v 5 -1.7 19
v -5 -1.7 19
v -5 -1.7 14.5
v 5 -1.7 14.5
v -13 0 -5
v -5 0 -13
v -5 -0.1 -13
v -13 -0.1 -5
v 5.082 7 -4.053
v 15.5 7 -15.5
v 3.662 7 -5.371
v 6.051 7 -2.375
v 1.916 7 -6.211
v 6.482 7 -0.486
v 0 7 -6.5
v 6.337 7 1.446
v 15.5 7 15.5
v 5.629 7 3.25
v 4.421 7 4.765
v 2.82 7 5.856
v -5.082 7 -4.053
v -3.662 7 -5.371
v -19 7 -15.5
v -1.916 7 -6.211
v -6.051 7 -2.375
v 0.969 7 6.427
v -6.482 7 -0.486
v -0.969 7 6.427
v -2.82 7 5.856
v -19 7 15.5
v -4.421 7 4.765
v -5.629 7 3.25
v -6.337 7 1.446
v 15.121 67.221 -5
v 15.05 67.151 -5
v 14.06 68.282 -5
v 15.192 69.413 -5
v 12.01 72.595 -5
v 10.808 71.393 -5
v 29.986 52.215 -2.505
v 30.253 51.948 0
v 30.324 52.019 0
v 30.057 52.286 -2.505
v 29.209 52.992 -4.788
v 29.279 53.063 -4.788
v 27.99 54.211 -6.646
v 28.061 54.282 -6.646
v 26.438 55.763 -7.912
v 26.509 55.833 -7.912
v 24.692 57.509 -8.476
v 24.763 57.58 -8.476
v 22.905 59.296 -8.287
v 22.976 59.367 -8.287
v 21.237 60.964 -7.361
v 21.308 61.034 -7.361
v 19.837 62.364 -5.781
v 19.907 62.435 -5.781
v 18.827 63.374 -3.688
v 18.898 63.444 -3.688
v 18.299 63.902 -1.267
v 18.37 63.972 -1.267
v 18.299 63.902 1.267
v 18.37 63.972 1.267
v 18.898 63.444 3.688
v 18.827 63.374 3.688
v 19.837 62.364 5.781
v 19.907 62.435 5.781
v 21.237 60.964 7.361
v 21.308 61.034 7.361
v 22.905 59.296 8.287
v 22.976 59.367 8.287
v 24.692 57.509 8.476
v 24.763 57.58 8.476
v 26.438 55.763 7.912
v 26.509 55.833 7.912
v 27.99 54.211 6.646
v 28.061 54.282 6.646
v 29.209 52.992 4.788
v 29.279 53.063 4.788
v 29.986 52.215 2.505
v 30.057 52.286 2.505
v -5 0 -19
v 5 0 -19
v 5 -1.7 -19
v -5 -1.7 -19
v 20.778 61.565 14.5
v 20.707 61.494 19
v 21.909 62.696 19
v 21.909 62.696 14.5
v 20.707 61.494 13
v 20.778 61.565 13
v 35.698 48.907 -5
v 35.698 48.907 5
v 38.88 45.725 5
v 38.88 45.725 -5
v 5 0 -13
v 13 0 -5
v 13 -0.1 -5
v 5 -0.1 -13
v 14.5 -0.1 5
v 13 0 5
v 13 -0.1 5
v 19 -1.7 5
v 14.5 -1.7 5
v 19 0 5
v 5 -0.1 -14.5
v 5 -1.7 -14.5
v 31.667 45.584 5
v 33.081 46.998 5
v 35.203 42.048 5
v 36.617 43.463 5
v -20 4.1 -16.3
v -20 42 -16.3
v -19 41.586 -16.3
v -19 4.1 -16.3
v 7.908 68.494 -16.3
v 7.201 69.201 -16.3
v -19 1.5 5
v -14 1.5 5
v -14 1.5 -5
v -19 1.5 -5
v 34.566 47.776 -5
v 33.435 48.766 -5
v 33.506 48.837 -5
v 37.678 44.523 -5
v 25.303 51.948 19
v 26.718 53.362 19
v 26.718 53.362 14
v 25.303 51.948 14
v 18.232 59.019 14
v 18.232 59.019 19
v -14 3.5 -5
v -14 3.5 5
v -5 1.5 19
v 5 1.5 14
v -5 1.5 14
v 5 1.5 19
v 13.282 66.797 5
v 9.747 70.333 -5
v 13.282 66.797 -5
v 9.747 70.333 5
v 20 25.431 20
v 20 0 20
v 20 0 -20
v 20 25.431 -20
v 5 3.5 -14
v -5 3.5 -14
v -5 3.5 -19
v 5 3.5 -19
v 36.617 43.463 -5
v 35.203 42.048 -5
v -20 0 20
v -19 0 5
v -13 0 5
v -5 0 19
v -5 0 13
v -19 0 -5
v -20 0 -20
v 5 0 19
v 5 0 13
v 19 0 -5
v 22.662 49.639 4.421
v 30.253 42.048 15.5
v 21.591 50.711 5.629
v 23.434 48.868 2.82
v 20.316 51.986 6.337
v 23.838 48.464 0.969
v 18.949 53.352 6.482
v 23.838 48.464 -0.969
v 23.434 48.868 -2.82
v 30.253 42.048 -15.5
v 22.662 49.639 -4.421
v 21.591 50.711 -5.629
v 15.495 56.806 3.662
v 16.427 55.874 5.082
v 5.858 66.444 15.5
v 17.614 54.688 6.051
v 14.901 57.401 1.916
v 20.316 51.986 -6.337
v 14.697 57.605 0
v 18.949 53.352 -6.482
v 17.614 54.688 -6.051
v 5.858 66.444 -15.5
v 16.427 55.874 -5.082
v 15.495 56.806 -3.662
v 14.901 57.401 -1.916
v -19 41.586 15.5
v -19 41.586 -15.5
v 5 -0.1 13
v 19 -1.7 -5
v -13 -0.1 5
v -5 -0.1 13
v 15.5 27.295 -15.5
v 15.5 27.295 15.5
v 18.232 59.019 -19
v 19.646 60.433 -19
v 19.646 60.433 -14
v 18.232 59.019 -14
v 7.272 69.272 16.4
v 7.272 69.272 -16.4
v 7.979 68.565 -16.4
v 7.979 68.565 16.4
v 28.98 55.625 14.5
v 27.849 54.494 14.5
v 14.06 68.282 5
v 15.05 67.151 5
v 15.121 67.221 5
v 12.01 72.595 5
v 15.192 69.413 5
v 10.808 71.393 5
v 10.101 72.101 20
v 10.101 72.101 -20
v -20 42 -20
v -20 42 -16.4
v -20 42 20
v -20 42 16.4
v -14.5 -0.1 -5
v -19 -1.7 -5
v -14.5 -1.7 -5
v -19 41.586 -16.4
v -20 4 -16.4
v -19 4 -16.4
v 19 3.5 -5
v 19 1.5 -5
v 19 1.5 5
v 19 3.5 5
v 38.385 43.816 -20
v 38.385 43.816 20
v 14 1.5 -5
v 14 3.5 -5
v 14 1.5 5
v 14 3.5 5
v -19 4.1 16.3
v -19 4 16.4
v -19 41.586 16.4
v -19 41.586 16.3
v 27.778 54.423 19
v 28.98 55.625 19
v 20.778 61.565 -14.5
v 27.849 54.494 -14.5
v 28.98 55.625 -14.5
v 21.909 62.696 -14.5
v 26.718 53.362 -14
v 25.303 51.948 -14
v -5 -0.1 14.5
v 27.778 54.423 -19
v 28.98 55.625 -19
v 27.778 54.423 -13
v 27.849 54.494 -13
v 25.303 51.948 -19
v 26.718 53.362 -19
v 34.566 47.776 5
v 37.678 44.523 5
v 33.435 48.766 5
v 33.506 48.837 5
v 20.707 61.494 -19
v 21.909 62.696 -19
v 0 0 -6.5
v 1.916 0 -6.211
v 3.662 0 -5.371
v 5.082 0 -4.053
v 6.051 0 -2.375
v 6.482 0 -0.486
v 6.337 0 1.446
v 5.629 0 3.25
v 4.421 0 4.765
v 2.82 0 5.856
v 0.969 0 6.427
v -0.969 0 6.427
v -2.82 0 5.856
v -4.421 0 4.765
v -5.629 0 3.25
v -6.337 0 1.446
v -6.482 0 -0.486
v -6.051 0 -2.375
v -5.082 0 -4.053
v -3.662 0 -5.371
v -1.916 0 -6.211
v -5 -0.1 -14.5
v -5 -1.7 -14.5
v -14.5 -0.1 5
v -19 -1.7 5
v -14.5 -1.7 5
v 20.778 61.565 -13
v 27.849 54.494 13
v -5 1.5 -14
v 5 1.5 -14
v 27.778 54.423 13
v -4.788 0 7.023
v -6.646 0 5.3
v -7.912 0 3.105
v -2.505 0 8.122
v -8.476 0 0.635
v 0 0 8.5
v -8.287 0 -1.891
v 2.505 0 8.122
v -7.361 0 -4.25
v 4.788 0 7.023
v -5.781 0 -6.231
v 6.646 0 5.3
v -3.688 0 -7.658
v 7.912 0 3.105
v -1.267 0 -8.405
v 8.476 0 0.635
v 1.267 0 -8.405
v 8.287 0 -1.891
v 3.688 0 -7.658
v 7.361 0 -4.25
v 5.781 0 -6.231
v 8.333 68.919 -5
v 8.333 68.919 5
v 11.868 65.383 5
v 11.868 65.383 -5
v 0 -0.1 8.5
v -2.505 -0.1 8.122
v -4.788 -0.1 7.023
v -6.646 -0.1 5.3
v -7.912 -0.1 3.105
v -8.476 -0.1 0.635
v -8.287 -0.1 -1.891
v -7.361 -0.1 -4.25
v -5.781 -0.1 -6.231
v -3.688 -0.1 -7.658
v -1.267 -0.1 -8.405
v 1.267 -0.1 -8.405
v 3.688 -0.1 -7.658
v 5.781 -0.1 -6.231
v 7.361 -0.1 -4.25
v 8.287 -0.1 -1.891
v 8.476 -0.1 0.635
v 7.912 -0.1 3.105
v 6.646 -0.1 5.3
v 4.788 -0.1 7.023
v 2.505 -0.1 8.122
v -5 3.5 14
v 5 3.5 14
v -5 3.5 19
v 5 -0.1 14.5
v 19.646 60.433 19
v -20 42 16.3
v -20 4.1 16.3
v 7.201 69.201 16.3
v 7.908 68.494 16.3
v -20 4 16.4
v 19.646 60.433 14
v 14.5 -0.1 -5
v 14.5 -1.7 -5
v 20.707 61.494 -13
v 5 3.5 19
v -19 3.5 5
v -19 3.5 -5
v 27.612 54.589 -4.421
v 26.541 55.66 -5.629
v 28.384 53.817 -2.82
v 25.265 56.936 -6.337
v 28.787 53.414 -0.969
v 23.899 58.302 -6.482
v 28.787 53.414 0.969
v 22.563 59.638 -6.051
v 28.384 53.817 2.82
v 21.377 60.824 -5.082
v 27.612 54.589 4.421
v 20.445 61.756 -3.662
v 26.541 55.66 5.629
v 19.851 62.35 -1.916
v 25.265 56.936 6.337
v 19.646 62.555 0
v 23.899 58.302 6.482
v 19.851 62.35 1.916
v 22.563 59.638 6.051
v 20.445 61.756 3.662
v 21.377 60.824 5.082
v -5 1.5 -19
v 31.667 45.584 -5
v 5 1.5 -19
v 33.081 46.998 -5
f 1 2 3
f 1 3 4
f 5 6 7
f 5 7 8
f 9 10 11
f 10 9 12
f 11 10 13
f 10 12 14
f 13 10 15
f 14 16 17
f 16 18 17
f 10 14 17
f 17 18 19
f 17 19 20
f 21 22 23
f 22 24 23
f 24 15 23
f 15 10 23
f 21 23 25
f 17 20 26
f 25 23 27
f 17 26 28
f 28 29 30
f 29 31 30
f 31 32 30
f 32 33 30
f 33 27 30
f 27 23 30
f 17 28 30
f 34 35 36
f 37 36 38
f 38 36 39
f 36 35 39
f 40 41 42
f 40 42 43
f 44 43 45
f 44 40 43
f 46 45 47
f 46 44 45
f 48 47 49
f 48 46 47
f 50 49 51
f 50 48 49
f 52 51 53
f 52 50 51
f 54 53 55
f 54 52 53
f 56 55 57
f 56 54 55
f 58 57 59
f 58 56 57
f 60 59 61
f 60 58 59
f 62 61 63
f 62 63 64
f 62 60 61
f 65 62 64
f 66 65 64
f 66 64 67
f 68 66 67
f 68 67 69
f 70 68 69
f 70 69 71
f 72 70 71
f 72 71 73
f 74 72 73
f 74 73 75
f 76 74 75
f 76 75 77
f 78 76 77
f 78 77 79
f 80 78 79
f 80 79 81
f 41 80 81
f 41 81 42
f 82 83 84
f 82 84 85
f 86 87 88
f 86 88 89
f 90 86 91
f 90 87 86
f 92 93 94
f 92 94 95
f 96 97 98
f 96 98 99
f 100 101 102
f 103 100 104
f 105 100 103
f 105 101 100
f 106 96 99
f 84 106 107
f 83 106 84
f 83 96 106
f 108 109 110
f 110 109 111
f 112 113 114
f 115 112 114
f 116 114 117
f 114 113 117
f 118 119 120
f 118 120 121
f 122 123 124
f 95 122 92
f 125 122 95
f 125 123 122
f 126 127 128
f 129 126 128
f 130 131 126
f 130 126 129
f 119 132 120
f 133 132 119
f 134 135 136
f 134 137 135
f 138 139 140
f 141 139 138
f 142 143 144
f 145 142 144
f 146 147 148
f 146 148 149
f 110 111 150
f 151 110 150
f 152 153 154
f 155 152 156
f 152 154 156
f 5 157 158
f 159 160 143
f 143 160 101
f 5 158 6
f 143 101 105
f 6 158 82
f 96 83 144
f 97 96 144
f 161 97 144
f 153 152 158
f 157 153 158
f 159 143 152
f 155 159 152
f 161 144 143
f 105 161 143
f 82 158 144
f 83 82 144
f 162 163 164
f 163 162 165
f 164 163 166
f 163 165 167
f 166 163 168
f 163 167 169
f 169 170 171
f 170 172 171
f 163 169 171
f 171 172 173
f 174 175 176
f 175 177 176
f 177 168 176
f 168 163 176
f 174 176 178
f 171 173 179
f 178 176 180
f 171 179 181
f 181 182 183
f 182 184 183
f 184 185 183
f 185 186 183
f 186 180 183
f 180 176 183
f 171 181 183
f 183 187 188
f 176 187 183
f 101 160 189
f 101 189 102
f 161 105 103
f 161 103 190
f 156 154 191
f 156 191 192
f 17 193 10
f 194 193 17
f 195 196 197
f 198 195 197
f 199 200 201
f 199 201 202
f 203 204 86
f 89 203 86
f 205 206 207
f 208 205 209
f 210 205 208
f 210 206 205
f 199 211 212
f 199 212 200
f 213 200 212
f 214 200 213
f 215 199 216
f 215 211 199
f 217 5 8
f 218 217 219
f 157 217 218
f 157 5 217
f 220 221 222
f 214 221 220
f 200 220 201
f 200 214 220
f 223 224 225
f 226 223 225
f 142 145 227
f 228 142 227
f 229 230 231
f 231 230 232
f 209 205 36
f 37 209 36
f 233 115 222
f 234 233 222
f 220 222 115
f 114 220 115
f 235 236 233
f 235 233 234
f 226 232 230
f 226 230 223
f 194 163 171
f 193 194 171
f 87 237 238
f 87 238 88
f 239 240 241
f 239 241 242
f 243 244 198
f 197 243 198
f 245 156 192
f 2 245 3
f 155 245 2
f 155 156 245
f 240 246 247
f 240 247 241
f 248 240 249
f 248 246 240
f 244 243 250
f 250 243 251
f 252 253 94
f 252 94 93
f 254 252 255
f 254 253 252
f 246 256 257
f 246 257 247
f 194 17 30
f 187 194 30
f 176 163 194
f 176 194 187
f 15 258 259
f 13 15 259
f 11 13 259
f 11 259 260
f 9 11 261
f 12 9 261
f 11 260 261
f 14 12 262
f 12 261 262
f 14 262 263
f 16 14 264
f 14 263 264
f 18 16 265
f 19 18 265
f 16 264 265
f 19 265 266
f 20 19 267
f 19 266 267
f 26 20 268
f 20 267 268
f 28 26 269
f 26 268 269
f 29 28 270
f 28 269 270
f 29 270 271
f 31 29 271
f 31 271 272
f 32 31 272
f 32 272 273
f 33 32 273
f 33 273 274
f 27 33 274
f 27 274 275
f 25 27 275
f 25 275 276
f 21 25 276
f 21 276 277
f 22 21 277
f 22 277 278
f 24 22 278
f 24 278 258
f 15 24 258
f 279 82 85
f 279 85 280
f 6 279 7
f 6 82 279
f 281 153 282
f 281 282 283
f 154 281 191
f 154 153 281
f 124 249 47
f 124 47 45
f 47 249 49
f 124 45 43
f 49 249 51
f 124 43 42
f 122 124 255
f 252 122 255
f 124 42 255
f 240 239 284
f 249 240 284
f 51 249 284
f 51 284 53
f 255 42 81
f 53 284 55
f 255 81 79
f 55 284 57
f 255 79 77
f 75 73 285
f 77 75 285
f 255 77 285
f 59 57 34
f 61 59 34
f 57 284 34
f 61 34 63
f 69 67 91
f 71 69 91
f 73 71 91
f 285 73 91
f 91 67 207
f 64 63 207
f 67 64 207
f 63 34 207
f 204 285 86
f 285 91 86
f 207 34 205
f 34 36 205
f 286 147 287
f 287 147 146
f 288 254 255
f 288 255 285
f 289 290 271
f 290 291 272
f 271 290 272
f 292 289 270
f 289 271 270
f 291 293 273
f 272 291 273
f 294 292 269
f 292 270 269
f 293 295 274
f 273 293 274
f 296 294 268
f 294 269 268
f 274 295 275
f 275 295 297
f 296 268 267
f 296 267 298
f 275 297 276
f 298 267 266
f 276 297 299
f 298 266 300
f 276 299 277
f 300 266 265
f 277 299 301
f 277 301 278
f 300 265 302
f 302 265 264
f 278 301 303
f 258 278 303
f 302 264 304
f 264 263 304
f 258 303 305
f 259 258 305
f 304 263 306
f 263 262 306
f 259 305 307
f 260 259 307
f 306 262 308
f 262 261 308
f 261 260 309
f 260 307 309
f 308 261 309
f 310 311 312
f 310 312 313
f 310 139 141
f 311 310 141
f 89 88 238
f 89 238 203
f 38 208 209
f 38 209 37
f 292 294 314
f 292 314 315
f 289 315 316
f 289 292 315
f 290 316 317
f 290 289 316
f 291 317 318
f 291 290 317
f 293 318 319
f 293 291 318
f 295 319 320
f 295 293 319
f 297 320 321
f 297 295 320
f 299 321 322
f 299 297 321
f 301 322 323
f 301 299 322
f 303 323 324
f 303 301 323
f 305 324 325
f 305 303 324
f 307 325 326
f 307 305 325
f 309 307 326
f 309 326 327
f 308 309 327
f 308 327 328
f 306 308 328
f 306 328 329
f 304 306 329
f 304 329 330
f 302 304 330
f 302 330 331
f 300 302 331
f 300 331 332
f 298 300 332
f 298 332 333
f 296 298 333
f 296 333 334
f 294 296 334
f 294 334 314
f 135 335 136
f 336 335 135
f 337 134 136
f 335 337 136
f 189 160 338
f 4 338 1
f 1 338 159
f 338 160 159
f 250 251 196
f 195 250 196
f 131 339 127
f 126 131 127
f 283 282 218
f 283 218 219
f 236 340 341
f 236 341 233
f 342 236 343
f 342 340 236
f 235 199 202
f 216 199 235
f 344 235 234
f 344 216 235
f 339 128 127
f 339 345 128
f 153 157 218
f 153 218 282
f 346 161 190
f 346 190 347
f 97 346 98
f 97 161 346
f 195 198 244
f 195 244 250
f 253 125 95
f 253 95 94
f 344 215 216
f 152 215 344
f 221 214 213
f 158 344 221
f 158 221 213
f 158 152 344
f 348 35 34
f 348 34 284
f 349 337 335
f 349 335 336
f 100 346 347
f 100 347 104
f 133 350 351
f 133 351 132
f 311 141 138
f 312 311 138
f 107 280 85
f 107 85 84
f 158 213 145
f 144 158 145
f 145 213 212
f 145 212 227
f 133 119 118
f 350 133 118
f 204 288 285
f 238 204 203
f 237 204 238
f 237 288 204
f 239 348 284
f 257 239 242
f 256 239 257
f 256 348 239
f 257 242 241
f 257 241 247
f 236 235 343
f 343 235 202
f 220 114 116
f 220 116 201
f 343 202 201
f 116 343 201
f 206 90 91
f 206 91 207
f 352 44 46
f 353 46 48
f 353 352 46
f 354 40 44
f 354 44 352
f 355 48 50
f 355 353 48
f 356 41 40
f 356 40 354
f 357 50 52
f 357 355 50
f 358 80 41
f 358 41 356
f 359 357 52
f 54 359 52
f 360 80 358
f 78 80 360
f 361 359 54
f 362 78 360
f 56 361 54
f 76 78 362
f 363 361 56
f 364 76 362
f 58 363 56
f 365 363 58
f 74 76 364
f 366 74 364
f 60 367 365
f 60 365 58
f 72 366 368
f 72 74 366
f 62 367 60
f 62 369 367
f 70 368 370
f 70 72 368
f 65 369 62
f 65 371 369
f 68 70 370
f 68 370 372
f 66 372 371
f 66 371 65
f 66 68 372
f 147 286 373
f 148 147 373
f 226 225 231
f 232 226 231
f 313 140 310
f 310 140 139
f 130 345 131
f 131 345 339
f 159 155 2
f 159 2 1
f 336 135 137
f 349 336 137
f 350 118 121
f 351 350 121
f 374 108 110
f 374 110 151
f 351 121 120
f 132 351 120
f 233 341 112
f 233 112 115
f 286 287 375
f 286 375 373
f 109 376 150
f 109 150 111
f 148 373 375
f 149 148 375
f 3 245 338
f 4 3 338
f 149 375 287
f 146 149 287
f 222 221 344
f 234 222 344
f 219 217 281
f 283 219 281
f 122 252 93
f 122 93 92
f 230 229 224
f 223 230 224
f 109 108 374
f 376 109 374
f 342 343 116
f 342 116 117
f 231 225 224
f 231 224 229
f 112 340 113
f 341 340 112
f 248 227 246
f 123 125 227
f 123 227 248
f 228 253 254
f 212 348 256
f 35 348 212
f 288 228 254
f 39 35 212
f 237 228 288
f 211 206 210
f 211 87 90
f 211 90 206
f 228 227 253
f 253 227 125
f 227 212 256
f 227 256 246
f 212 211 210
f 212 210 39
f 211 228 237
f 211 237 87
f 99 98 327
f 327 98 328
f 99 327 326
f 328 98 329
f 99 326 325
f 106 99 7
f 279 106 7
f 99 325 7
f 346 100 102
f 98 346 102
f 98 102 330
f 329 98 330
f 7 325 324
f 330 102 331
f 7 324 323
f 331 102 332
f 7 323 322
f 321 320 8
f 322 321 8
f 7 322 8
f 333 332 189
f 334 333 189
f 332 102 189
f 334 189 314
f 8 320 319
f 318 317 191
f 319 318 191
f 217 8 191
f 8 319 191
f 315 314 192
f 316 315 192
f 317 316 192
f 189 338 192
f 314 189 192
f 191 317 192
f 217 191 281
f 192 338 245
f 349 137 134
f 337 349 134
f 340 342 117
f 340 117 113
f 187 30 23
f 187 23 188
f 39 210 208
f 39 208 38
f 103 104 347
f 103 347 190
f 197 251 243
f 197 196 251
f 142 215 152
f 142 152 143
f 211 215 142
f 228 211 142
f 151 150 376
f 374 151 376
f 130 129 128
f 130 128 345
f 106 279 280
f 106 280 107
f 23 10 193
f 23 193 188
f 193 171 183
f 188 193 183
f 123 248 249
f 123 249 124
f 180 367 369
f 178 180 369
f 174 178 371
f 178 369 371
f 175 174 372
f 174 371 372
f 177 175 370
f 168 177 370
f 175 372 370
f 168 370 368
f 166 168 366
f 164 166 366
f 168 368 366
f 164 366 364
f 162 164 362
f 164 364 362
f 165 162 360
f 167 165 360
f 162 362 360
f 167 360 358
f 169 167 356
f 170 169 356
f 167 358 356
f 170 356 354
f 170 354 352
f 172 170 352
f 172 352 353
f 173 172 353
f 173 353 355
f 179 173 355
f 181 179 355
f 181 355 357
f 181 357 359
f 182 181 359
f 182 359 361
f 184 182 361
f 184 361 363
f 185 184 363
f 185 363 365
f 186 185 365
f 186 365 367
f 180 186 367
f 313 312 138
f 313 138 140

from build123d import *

# Parameters (mm, degrees)
SKETCH_2_W           = 40
SKETCH_2_H           = 40
EXTRUDE_1_DEPTH      = 42
CUT_EXTRUDE_1_DEPTH  = 42
CUT_EXTRUDE_START    = 7
SKETCH_5_W           = 35.4
SKETCH_5_H           = 30.8
CUT_EXTRUDE_2_DEPTH  = 42
EXTRUDE_2_DEPTH      = 40
CUT_EXTRUDE_3_REACH  = 81.267
CUT_EXTRUDE_START_2  = -7
SKETCH_7_W           = 31
SKETCH_7_H           = 35.5
CUT_EXTRUDE_4_DEPTH  = 1
CUT_EXTRUDE_5_DEPTH  = 1
SKETCH_14_W          = 31
SKETCH_14_H          = 34.585786438
CUT_EXTRUDE_7_DEPTH  = 34.5
SKETCH_15_R          = 6.5
CUT_EXTRUDE_8_DEPTH  = 10
SKETCH_16_R          = 6.5
CUT_EXTRUDE_9_DEPTH  = 10
SKETCH_17_R          = 8.5
CUT_EXTRUDE_10_DEPTH = 3.5
SKETCH_19_W          = 28
SKETCH_19_H          = 28
SKETCH_19_R          = 6.5
EXTRUDE_3_DEPTH      = 2
SKETCH_20_R          = 8.5
CUT_EXTRUDE_11_DEPTH = 3.5
SKETCH_21_W          = 28
SKETCH_21_H          = 28
SKETCH_21_R          = 6.5
EXTRUDE_4_DEPTH      = 2
EXTRUDE_START        = 0.1
EXTRUDE_5_DEPTH      = 32.6
SKETCH_23_R          = 8.5
EXTRUDE_6_DEPTH      = 1.6
SKETCH_24_W          = 10
SKETCH_24_H          = 4.5
SKETCH_24_W_2        = 4.5
SKETCH_24_H_2        = 10
EXTRUDE_7_DEPTH      = 1.6
SKETCH_25_R          = 8.5
EXTRUDE_8_DEPTH      = 1.6
SKETCH_26_W          = 10
SKETCH_26_H          = 4.5
SKETCH_26_W_2        = 4.5
SKETCH_26_H_2        = 10
EXTRUDE_9_DEPTH      = 1.6


with BuildPart() as part:
    # Эскиз2 → Бобышка-Вытянуть1 (new body)
    with BuildSketch(Plane(origin=(0, 0, 0), x_dir=(1, 0, 0), z_dir=(0, 1, 0))):
        Rectangle(SKETCH_2_W, SKETCH_2_H)
    extrude(amount=EXTRUDE_1_DEPTH)

    # Эскиз4 → Вырез-Вытянуть1 (cut)
    with BuildSketch(Plane.XY.offset(20)):
        Polygon((20, 42), (-20, 42), (20, 25.431457505), align=None)
    extrude(amount=-CUT_EXTRUDE_1_DEPTH, mode=Mode.SUBTRACT)

    # Эскиз5 → Вырез-Вытянуть2 (cut)
    with BuildSketch(Plane(origin=(0, 0, 0), x_dir=(1, 0, 0), z_dir=(0, 1, 0)).offset(CUT_EXTRUDE_START)):
        with Locations((-2.3, 0)):
            Rectangle(SKETCH_5_W, SKETCH_5_H)
    extrude(amount=CUT_EXTRUDE_2_DEPTH, mode=Mode.SUBTRACT)

    # Эскиз6 → Бобышка-Вытянуть2 (add)
    with BuildSketch(Plane.XY.offset(20)):
        Polygon((20, 25.431457505), (38.384776311, 43.816233816), (10.100505063, 72.100505063), (-20, 42), align=None)
    extrude(amount=-EXTRUDE_2_DEPTH)

    # Вырез-Вытянуть3: up to this plane
    cut_extrude_3_end = Plane(origin=(20, 25.431457505, -94.744779783), z_dir=(0.382683432, 0.923879533, 0))
    # Эскиз7 → Вырез-Вытянуть3 (cut, up to the surface)
    with BuildSketch(Plane(origin=(41.100505063, 41.100505063, 0), x_dir=(0, 0, -1), z_dir=(0.707106781, 0.707106781, 0)).offset(CUT_EXTRUDE_START_2), mode=Mode.PRIVATE) as cut_extrude_3_sk1:
        with Locations((0, 26.090620434)):
            Rectangle(SKETCH_7_W, SKETCH_7_H)
    cut_extrude_3_tool1 = split(extrude(cut_extrude_3_sk1.sketch, amount=-CUT_EXTRUDE_3_REACH, mode=Mode.PRIVATE), bisect_by=cut_extrude_3_end, keep=Keep.BOTH, mode=Mode.PRIVATE)
    add(cut_extrude_3_tool1.solids().sort_by_distance((17.701903, 54.599612, 0))[0], mode=Mode.SUBTRACT)

    # Эскиз8 → Вырез-Вытянуть4 (cut)
    with BuildSketch(Plane.ZY.offset(20)):
        Polygon((-16.4, 42), (-16.4, 4), (16.4, 4), (16.4, 42), (15.4, 42), (15.4, 7), (-15.4, 7), (-15.4, 42), align=None)
    extrude(amount=-CUT_EXTRUDE_4_DEPTH, mode=Mode.SUBTRACT)

    # Эскиз12 → Вырез-Вытянуть5 (cut)
    with BuildSketch(Plane(origin=(-31, 31, 0), x_dir=(0, 0, 1), z_dir=(-0.707106781, 0.707106781, 0))):
        Polygon((-16.4, 15.556349186), (-16.4, 54.124891681), (16.4, 54.124891681), (16.4, 15.556349186), (15.5, 15.556349186), (15.5, 51.124891681), (-15.5, 51.124891681), (-15.5, 15.556349186), align=None)
    extrude(amount=-CUT_EXTRUDE_5_DEPTH, mode=Mode.SUBTRACT)

    # Эскиз14 → Вырез-Вытянуть7 (cut)
    with BuildSketch(Plane.ZY.offset(19)):
        with Locations((0, 24.292893219)):
            Rectangle(SKETCH_14_W, SKETCH_14_H)
    extrude(amount=-CUT_EXTRUDE_7_DEPTH, mode=Mode.SUBTRACT)

    # Эскиз15 → Вырез-Вытянуть8 (cut)
    with BuildSketch(Plane(origin=(41.100505063, 41.100505063, 0), x_dir=(0, 0, -1), z_dir=(0.707106781, 0.707106781, 0))):
        with Locations(Location((0, 23.840620434, 0), (0, 0, 90))):  # turned: the seam where the file's is
            Circle(SKETCH_15_R)
    extrude(amount=-CUT_EXTRUDE_8_DEPTH, mode=Mode.SUBTRACT)

    # Эскиз16 → Вырез-Вытянуть9 (cut)
    with BuildSketch(Plane.XZ):
        with Locations(Location((0, 0, 0), (0, 0, 270))):  # turned: the seam where the file's is
            Circle(SKETCH_16_R)
    extrude(amount=-CUT_EXTRUDE_9_DEPTH, mode=Mode.SUBTRACT)

    # Эскиз17 → Вырез-Вытянуть10 (cut)
    with BuildSketch(Plane(origin=(41.100505063, 41.100505063, 0), x_dir=(0, 0, -1), z_dir=(0.707106781, 0.707106781, 0))):
        Polygon((0, 42.840620434), (-5, 42.840620434), (-5, 36.840620434), (-13, 28.840620434), (-19, 28.840620434), (-19, 23.840620434), (-19, 18.840620434), (-13, 18.840620434), (-5, 10.840620434), (-5, 4.840620434), (5, 4.840620434), (5, 10.840620434), (13, 18.840620434), (19, 18.840620434), (19, 28.840620434), (13, 28.840620434), (5, 36.840620434), (5, 42.840620434), align=None)
        with Locations(Location((0, 23.840620434, 0), (0, 0, 90))):  # turned: the seam where the file's is
            Circle(SKETCH_17_R, mode=Mode.SUBTRACT)
    extrude(amount=-CUT_EXTRUDE_10_DEPTH, mode=Mode.SUBTRACT)

    # Эскиз19 → Бобышка-Вытянуть3 (add)
    with BuildSketch(Plane(origin=(38.625631329, 38.625631329, 0), x_dir=(0, 0, -1), z_dir=(0.707106781, 0.707106781, 0))):
        with Locations((0, 23.840620434)):
            Rectangle(SKETCH_19_W, SKETCH_19_H)
        with Locations(Location((0, 23.840620434, 0), (0, 0, 90))):  # turned: the seam where the file's is
            Circle(SKETCH_19_R, mode=Mode.SUBTRACT)
    extrude(amount=EXTRUDE_3_DEPTH)

    # Эскиз20 → Вырез-Вытянуть11 (cut)
    with BuildSketch(Plane.XZ):
        Polygon((0, 19), (-5, 19), (-5, 13), (-13, 5), (-19, 5), (-19, 0), (-19, -5), (-13, -5), (-5, -13), (-5, -19), (5, -19), (5, -13), (13, -5), (19, -5), (19, 5), (13, 5), (5, 13), (5, 19), align=None)
        with Locations(Location((0, 0, 0), (0, 0, 270))):  # turned: the seam where the file's is
            Circle(SKETCH_20_R, mode=Mode.SUBTRACT)
    extrude(amount=-CUT_EXTRUDE_11_DEPTH, mode=Mode.SUBTRACT)

    # Эскиз21 → Бобышка-Вытянуть4 (add)
    with BuildSketch(Plane.XZ.offset(-3.5)):
        Rectangle(SKETCH_21_W, SKETCH_21_H)
        with Locations(Location((0, 0, 0), (0, 0, 270))):  # turned: the seam where the file's is
            Circle(SKETCH_21_R, mode=Mode.SUBTRACT)
    extrude(amount=EXTRUDE_4_DEPTH)

    # Эскиз22 → Бобышка-Вытянуть5 (add)
    with BuildSketch(Plane(origin=(0, 0, 16.4), x_dir=(-1, 0, 0), z_dir=(0, 0, -1)).offset(EXTRUDE_START)):
        Polygon((-7.908474042, 68.494260479), (-7.201367261, 69.201367261), (20, 42), (20, 4.1), (19, 4.1), (19, 41.585786438), align=None)
    extrude(amount=EXTRUDE_5_DEPTH)

    # Эскиз23 → Бобышка-Вытянуть6 (add)
    with BuildSketch(Plane(origin=(40.039844892, 40.039844892, 0), x_dir=(0, 0, -1), z_dir=(0.707106781, 0.707106781, 0))):
        Polygon((-19, 18.840620434), (-19, 28.840620434), (-13, 28.840620434), (-5, 36.840620434), (-5, 42.840620434), (5, 42.840620434), (5, 36.840620434), (13, 28.840620434), (19, 28.840620434), (19, 18.840620434), (13, 18.840620434), (5, 10.840620434), (5, 4.840620434), (-5, 4.840620434), (-5, 10.840620434), (-13, 18.840620434), align=None)
        with Locations(Location((0, 23.840620434, 0), (0, 0, 270))):  # turned: the seam where the file's is
            Circle(SKETCH_23_R, mode=Mode.SUBTRACT)
    extrude(amount=EXTRUDE_6_DEPTH)

    # Эскиз24 → Бобышка-Вытянуть7 (add)
    with BuildSketch(Plane(origin=(41.171215742, 41.171215742, 0), x_dir=(0, 0, -1), z_dir=(0.707106781, 0.707106781, 0))):
        with Locations((0, 40.590620434)):
            Rectangle(SKETCH_24_W, SKETCH_24_H)
        with Locations((-16.75, 23.840620434)):
            Rectangle(SKETCH_24_W_2, SKETCH_24_H_2)
        with Locations((0, 7.090620434)):
            Rectangle(SKETCH_24_W, SKETCH_24_H)
        with Locations((16.75, 23.840620434)):
            Rectangle(SKETCH_24_W_2, SKETCH_24_H_2)
    extrude(amount=EXTRUDE_7_DEPTH)

    # Эскиз25 → Бобышка-Вытянуть8 (add)
    with BuildSketch(Plane.XZ.offset(-1.5)):
        Polygon((-5, 13), (-5, 19), (5, 19), (5, 13), (13, 5), (19, 5), (19, -5), (13, -5), (5, -13), (5, -19), (-5, -19), (-5, -13), (-13, -5), (-19, -5), (-19, 5), (-13, 5), align=None)
        with Locations(Location((0, 0, 0), (0, 0, 90))):  # turned: the seam where the file's is
            Circle(SKETCH_25_R, mode=Mode.SUBTRACT)
    extrude(amount=EXTRUDE_8_DEPTH)

    # Эскиз26 → Бобышка-Вытянуть9 (add)
    with BuildSketch(Plane.XZ.offset(0.1)):
        with Locations((0, 16.75)):
            Rectangle(SKETCH_26_W, SKETCH_26_H)
        with Locations((16.75, 0)):
            Rectangle(SKETCH_26_W_2, SKETCH_26_H_2)
        with Locations((0, -16.75)):
            Rectangle(SKETCH_26_W, SKETCH_26_H)
        with Locations((-16.75, 0)):
            Rectangle(SKETCH_26_W_2, SKETCH_26_H_2)
    extrude(amount=EXTRUDE_9_DEPTH)


solid = part.part
